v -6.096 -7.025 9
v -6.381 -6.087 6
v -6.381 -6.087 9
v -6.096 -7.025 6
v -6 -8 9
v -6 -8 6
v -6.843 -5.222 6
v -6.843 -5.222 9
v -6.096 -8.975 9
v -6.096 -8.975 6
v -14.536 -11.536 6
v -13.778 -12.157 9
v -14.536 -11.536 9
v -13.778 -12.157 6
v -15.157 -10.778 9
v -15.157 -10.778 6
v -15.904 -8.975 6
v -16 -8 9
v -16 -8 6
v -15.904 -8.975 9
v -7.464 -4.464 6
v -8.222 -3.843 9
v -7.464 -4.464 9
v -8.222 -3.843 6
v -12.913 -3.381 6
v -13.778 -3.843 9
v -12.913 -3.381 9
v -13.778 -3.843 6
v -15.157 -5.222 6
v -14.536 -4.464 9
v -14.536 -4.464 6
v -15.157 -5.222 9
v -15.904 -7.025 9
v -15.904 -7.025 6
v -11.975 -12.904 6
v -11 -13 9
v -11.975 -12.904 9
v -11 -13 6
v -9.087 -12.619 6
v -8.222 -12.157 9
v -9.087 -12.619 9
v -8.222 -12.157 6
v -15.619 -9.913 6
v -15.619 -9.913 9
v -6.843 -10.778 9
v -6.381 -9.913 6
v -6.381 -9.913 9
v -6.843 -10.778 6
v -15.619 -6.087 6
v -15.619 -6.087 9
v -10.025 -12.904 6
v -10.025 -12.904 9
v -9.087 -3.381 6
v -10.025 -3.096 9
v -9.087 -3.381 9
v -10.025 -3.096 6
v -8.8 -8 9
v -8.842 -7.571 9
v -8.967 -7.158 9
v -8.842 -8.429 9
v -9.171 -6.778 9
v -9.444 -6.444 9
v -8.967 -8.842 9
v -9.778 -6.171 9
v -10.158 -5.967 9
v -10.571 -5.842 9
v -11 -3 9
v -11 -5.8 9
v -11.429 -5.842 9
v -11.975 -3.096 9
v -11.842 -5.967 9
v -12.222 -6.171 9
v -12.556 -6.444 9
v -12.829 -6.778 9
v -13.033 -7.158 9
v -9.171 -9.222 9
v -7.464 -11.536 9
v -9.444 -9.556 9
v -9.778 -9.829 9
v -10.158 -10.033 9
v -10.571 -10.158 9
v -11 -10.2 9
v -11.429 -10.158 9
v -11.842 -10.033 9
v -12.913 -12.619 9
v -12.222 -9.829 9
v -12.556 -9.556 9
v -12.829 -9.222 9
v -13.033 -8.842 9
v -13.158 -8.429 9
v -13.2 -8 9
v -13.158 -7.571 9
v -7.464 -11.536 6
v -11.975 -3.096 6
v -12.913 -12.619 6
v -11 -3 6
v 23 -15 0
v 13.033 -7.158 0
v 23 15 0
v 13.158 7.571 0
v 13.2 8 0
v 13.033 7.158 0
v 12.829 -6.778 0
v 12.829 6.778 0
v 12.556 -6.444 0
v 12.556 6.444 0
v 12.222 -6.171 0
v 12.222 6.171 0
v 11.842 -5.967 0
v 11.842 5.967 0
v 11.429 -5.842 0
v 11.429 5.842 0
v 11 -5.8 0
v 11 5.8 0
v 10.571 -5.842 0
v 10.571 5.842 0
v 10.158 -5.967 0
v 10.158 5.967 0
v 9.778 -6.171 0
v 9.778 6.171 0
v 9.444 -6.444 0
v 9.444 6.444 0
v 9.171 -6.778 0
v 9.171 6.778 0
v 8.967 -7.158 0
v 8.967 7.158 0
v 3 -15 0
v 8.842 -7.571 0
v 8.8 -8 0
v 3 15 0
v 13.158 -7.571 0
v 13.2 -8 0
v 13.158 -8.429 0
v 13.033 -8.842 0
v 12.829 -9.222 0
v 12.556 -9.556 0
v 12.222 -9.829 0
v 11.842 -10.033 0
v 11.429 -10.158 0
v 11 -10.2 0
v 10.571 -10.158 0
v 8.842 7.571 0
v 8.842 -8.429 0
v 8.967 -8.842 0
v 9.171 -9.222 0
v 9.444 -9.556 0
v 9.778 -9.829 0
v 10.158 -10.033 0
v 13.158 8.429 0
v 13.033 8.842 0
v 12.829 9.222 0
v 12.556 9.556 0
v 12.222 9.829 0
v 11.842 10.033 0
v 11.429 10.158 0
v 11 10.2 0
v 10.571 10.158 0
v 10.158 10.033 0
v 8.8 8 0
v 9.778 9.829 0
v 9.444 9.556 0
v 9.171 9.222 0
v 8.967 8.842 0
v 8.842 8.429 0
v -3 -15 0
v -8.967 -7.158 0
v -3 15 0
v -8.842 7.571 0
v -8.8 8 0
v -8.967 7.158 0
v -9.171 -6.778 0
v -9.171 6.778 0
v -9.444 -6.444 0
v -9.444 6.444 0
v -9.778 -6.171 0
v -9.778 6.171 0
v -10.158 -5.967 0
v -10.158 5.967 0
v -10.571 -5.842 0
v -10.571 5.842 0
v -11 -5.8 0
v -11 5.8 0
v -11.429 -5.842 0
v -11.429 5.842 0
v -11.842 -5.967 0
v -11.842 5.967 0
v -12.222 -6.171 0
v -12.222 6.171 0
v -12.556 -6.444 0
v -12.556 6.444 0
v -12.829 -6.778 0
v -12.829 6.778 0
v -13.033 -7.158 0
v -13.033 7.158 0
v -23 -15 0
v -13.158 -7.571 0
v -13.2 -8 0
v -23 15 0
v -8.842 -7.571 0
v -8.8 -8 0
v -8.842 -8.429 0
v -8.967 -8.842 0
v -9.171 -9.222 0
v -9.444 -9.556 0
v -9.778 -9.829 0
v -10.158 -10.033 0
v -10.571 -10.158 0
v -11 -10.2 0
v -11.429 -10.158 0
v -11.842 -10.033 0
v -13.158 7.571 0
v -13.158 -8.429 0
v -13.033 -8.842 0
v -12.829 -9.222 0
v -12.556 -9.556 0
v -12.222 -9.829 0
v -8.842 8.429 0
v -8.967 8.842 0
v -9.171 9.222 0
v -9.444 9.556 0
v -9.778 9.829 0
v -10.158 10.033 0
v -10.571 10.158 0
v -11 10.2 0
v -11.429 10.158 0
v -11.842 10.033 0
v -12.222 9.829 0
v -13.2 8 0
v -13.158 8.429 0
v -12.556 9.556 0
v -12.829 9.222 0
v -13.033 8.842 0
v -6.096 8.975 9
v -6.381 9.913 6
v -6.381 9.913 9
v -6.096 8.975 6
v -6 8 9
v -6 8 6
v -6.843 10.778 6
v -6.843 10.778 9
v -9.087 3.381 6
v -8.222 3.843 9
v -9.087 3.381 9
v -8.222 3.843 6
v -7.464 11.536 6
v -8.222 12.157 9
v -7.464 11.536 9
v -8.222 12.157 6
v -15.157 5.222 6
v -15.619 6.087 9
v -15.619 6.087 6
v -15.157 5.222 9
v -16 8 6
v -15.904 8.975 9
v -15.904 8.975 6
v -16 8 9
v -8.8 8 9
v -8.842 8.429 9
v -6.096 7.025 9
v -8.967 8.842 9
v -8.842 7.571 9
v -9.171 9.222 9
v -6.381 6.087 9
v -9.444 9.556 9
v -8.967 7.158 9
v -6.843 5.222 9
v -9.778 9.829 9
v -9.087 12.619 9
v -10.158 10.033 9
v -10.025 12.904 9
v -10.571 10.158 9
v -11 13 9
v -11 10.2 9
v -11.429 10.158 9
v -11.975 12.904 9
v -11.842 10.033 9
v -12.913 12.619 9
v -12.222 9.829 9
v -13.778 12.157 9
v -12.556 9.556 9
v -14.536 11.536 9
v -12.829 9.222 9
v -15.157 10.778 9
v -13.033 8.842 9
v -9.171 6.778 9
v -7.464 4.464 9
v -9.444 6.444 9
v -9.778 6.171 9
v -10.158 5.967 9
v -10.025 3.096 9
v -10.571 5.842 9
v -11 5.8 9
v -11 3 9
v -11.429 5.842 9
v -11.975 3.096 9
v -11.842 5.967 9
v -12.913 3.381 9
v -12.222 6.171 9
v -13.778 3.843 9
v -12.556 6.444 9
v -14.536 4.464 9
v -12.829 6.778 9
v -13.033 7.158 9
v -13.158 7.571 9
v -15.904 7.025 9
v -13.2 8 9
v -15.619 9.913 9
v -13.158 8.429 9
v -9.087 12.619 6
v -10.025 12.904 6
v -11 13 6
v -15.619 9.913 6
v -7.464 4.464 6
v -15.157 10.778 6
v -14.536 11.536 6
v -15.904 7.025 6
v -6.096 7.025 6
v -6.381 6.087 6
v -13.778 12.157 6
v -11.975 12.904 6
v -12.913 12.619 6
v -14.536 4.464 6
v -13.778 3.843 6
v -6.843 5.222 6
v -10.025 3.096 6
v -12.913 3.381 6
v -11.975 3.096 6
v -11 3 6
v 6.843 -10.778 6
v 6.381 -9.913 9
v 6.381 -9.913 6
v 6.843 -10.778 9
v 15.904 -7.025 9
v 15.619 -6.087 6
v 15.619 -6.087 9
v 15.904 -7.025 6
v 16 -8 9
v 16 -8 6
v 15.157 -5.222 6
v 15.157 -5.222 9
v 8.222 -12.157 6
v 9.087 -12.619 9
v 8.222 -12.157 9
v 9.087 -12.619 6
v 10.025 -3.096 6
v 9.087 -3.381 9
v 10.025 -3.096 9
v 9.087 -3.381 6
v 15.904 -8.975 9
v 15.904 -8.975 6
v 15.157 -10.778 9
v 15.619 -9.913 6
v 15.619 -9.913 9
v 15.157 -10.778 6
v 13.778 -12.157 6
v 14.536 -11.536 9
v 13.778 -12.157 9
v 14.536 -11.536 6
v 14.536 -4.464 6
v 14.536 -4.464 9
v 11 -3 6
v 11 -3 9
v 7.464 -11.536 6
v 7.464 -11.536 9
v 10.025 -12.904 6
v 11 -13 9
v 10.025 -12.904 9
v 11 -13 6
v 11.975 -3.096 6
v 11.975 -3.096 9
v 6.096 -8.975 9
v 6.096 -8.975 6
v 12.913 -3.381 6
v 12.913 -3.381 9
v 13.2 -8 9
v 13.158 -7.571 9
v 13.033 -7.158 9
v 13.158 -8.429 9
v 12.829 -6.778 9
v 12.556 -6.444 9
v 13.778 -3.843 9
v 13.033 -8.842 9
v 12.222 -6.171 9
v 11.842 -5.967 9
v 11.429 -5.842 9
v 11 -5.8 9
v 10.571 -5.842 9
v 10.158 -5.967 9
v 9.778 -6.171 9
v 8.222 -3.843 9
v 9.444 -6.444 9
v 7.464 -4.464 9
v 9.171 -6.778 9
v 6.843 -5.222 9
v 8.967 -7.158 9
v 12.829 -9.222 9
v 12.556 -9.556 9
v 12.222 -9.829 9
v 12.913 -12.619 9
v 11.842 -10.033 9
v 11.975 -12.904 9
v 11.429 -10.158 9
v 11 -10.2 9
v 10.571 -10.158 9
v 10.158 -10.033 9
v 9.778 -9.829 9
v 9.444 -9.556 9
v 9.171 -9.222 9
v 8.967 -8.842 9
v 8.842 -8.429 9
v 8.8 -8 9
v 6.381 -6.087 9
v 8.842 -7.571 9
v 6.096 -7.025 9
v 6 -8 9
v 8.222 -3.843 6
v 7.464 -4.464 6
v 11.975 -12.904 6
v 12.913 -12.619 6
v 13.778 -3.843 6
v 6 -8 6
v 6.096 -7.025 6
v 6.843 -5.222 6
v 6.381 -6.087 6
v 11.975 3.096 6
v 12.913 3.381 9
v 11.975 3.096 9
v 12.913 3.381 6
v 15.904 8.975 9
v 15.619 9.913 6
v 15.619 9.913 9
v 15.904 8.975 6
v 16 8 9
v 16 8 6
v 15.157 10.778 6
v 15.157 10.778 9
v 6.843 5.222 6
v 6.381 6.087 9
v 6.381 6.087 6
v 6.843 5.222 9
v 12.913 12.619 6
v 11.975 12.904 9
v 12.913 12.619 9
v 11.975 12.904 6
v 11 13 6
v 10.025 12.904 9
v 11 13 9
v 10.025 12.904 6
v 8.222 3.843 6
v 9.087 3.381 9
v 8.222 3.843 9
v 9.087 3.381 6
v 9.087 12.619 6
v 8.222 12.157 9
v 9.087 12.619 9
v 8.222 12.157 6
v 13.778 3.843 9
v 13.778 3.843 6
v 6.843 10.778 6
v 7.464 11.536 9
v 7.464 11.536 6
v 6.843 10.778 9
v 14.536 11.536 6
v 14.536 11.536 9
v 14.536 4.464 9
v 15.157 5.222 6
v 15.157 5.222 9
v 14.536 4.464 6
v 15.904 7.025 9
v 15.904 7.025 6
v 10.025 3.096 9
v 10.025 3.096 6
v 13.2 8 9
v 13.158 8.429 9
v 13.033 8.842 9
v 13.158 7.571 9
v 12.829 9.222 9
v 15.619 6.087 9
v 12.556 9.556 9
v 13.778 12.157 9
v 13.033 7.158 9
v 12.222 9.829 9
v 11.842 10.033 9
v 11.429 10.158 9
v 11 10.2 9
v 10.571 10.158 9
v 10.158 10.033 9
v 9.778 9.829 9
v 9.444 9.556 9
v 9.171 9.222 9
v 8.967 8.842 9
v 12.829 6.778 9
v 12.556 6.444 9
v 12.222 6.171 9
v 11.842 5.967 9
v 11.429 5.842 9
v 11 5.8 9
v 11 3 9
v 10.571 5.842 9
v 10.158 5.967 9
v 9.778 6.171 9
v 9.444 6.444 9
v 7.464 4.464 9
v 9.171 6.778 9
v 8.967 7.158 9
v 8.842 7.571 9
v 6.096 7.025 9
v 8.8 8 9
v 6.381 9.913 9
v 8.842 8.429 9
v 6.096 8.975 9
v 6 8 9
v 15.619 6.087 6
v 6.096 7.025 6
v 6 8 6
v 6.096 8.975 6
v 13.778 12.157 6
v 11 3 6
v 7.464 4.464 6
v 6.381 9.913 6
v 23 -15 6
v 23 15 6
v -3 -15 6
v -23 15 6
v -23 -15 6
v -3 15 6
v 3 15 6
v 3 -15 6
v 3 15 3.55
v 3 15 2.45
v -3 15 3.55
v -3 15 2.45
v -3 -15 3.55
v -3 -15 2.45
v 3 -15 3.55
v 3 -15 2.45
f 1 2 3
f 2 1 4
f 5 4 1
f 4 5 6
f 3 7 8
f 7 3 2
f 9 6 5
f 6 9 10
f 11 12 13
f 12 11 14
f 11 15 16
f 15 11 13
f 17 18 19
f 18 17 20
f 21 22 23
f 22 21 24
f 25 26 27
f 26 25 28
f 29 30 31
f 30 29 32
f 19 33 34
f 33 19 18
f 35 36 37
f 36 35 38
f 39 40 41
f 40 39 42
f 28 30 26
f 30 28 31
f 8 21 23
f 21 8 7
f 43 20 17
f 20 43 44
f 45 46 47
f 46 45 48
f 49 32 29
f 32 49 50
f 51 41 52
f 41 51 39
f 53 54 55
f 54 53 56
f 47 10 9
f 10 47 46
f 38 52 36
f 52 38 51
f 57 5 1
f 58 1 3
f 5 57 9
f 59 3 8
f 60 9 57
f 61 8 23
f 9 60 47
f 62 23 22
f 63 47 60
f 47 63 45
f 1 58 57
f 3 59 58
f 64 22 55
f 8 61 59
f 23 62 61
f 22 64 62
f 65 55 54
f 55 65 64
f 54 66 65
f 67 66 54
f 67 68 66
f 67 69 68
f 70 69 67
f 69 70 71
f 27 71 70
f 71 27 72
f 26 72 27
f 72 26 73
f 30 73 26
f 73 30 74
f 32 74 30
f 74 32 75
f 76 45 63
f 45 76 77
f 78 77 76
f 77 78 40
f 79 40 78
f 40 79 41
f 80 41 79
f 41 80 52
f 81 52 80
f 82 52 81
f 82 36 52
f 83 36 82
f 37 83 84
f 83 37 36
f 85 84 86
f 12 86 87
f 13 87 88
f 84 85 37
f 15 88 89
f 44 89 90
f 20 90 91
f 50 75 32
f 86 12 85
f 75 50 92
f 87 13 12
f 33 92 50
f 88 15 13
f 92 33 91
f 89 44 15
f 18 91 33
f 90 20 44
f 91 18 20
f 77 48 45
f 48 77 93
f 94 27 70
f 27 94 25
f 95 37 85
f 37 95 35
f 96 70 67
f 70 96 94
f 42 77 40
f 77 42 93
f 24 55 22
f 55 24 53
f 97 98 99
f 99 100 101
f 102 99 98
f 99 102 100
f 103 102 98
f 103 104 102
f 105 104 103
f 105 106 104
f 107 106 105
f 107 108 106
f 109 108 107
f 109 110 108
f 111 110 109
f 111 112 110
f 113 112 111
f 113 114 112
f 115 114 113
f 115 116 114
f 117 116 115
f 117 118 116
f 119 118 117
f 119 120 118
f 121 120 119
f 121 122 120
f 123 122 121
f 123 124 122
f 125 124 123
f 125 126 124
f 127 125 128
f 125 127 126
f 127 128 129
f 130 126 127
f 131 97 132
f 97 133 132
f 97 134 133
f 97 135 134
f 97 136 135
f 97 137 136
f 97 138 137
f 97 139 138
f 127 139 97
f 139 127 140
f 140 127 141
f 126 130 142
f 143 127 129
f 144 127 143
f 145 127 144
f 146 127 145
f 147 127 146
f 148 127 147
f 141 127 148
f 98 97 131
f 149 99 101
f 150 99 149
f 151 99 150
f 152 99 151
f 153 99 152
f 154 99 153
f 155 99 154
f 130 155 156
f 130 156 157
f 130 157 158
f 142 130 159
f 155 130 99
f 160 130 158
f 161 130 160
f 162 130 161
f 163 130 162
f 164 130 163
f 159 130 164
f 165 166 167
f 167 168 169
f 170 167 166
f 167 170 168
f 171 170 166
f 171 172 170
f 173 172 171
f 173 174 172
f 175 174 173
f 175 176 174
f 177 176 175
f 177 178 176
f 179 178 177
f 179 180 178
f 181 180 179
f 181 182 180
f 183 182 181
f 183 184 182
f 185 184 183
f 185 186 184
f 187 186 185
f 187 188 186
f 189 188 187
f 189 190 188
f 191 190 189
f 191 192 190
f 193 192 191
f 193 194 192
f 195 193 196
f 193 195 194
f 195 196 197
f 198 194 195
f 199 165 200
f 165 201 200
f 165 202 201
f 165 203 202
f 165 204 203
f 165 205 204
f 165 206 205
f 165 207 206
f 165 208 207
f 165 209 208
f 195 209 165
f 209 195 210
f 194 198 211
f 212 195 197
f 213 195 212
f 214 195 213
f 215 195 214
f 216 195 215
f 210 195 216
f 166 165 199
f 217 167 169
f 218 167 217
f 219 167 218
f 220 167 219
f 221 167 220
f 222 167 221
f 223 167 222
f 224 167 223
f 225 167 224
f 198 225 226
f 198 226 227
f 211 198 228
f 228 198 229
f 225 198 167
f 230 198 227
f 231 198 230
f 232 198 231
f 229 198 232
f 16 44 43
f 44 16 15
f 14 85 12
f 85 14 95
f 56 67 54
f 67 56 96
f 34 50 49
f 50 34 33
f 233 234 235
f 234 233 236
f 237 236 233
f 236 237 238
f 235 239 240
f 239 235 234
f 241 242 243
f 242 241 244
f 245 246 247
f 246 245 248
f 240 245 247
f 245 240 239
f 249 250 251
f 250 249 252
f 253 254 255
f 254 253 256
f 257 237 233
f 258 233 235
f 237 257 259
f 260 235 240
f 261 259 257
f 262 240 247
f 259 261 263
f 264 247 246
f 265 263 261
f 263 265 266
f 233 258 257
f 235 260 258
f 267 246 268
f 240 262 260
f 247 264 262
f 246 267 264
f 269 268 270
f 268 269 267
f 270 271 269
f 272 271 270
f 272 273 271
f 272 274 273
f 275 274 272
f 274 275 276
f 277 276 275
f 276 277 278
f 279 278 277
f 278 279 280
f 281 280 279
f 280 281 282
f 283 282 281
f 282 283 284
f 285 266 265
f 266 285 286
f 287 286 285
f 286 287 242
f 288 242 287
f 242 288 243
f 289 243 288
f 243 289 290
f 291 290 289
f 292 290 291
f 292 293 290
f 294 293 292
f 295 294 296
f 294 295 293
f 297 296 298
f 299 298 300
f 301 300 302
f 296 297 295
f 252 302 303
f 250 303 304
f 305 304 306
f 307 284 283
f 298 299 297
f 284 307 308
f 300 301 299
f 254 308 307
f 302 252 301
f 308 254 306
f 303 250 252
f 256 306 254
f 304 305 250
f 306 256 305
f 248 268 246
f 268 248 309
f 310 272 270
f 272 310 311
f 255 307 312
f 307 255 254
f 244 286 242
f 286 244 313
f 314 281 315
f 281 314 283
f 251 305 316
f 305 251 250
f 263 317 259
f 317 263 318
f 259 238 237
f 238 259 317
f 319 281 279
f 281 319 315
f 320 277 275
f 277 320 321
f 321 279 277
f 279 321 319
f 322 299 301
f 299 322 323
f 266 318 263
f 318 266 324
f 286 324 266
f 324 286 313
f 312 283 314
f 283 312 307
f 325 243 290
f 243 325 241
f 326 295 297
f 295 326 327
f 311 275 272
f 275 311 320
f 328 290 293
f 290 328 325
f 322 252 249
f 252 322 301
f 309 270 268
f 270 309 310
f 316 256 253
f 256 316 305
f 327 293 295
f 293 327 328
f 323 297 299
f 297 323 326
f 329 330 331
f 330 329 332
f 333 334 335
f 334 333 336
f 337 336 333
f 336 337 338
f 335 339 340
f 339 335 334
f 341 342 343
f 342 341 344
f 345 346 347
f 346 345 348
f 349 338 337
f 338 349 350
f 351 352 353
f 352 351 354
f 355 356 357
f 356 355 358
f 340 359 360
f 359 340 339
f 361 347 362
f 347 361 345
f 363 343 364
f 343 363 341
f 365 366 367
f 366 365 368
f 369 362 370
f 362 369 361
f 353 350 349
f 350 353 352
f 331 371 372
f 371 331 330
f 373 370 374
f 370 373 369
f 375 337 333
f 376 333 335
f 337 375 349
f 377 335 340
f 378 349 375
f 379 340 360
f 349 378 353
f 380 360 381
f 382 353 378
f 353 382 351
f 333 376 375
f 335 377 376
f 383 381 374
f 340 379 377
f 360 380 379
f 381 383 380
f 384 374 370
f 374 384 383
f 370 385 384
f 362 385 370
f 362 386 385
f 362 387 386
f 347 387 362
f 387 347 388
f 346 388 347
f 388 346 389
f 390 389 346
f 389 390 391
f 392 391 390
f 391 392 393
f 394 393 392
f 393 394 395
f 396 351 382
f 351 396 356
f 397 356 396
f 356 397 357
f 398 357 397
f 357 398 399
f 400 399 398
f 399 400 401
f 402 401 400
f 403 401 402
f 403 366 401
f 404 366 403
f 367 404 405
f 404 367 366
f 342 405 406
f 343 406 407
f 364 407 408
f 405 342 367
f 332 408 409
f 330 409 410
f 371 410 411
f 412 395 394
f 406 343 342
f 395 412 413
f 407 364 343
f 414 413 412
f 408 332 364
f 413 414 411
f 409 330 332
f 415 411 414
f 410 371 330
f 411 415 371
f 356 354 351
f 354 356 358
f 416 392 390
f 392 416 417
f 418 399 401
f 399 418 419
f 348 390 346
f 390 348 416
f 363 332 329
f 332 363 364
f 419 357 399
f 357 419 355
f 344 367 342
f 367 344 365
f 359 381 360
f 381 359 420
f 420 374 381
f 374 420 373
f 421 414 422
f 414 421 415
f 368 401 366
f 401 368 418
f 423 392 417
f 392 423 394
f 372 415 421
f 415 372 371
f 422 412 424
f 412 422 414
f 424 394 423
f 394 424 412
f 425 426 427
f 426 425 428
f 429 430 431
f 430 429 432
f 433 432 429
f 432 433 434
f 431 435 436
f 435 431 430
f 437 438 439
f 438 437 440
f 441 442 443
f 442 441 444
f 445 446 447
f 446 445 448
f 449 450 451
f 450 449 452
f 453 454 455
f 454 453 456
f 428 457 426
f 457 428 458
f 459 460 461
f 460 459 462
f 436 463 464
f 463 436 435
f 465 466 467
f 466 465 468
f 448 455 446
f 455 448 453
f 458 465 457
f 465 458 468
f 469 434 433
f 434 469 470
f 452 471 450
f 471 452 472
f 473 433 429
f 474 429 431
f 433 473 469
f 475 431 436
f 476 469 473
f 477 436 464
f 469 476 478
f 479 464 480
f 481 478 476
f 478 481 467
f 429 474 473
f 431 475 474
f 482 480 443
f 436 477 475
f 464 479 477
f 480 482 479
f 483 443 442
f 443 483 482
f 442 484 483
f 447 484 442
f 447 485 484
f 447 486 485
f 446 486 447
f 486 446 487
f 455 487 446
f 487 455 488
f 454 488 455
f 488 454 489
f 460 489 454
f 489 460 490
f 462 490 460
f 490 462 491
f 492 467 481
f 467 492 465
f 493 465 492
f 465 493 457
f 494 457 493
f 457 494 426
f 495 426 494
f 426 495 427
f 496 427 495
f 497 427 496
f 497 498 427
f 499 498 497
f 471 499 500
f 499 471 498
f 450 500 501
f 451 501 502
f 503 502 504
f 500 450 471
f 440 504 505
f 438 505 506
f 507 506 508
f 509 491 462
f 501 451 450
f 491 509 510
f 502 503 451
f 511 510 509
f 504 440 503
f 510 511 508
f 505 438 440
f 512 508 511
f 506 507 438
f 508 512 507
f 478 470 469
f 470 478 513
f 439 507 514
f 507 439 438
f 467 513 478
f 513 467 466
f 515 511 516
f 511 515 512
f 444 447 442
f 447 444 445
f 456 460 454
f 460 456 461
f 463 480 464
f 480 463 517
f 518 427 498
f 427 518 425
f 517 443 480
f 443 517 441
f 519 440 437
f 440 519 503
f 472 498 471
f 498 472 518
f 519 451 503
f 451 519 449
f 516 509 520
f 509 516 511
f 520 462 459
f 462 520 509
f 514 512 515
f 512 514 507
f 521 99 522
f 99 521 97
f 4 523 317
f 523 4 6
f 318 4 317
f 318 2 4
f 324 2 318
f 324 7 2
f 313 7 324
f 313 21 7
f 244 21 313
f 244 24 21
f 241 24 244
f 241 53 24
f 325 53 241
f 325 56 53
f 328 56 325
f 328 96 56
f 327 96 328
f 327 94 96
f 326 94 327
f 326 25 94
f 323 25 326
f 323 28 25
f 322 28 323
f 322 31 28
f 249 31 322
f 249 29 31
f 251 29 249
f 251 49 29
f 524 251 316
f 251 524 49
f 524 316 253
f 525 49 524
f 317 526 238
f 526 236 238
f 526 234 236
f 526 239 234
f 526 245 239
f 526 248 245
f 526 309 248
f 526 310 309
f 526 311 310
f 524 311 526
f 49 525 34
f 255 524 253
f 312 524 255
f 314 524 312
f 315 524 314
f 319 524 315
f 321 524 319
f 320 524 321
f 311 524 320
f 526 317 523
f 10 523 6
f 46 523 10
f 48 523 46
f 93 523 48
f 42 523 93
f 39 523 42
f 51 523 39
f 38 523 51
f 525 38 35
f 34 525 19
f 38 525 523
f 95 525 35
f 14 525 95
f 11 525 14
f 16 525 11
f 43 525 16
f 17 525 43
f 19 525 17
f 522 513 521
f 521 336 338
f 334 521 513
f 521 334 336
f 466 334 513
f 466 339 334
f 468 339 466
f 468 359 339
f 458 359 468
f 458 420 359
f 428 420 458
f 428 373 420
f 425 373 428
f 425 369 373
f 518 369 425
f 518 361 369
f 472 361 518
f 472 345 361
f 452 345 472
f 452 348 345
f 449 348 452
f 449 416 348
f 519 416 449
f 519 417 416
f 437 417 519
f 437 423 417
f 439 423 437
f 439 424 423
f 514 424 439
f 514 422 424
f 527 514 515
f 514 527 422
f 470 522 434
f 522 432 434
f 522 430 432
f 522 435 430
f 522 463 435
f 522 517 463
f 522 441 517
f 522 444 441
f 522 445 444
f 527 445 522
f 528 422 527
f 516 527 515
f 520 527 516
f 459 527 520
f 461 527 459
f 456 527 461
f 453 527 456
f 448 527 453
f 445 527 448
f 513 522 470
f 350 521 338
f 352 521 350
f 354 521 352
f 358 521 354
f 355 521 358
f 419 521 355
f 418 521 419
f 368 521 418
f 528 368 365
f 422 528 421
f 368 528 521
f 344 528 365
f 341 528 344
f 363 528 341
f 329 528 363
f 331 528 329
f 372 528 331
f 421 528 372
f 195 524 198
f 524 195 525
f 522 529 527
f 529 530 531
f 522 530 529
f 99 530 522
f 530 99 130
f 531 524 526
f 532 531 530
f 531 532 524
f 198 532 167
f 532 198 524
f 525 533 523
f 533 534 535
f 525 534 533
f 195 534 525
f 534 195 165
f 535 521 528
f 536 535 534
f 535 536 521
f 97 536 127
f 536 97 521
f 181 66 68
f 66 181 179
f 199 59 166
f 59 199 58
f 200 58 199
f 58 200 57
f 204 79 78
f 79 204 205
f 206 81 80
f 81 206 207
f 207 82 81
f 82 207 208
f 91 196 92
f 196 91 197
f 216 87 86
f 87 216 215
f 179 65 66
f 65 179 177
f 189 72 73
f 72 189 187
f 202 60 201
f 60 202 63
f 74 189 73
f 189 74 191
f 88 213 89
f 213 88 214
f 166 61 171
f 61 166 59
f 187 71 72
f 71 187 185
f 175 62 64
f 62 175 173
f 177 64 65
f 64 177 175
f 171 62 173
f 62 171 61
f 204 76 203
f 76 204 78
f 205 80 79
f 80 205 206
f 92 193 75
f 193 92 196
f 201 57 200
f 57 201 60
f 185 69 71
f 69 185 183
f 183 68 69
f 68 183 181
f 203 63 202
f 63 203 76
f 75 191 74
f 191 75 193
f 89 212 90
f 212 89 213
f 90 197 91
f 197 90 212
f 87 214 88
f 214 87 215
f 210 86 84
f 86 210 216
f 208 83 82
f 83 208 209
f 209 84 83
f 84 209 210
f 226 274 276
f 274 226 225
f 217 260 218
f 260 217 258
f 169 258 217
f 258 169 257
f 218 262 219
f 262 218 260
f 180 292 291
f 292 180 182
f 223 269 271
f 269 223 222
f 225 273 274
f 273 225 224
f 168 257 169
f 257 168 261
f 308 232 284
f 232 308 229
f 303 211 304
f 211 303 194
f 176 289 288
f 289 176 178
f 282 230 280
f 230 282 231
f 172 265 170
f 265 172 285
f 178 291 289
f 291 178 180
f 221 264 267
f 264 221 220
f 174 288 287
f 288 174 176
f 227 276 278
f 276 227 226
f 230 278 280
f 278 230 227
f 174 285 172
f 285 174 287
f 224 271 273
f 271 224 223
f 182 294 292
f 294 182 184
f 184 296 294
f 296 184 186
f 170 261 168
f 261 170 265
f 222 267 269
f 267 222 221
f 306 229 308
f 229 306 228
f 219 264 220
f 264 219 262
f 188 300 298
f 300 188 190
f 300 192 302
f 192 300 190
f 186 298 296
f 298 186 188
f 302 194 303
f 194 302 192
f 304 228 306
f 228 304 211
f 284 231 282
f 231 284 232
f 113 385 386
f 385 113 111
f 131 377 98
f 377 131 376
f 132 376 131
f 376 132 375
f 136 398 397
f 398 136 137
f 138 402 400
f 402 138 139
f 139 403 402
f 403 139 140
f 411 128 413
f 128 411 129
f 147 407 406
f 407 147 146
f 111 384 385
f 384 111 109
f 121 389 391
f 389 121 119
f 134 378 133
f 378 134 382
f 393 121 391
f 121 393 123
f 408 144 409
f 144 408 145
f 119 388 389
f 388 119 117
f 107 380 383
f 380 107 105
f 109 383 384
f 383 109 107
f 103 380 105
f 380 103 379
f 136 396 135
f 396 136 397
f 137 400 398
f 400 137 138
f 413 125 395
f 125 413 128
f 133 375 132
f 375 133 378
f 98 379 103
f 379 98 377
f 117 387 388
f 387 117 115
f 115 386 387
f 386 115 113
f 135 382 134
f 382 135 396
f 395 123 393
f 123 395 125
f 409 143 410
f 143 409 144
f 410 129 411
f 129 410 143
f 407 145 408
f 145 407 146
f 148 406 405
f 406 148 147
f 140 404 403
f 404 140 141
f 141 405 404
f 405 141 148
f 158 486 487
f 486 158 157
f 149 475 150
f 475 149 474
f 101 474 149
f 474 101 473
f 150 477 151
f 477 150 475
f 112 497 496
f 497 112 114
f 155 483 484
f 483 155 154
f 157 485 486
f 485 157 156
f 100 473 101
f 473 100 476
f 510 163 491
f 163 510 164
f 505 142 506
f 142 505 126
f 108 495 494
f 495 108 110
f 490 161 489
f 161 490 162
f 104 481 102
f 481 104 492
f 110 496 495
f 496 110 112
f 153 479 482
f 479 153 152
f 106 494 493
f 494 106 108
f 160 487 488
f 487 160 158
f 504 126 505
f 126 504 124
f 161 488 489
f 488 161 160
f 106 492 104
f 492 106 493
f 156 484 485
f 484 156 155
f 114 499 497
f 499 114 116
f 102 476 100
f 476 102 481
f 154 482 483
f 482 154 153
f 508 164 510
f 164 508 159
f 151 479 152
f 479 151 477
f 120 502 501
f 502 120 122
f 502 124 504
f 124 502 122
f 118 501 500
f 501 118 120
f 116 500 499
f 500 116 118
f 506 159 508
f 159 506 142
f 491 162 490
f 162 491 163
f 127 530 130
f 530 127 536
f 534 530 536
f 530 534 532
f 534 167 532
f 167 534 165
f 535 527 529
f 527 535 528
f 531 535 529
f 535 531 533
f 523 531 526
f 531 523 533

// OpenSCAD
$fn = 32;

// ----------------------------------------------------------------------
// Living hinge: 46 x 30 mm plates, 1.1 mm flexible web
// ----------------------------------------------------------------------

// --- parameters (mm) ---
plate_len = 20;           // plate length outside the web
plate_w = 30;             // plate width
thick = 6;                // plate thickness
web_half = 3;             // half width of the flex band
web_t = 1.1;              // flexible web thickness
web_z = 2.45;             // web position inside the thickness
boss_d = 10;              // screw boss diameter
boss_h = 9;               // screw boss height
boss_x = 11;              // screw boss distance from the web
screw_d = 4.4;            // screw hole

difference() {
  union() {
    /* one flat strip, later thinned at the middle */
    translate([-23, -15, 0]) cube([46, 30, 6]);
    /* screw bosses, sunk 0.5 mm into the plates */
    for (sx = [-11, 11]) {
      for (sy = [-8, 8]) {
        translate([sx, sy, 0]) cylinder(h = boss_h, d = boss_d);
      }
    }
  }
  /* channel from below: leaves the web on top of it */
  translate([-3, -17.5, -2.5]) cube([6, 35, 4.95]);
  /* channel from above: thins the web down to web_t */
  translate([-3, -17.5, 3.55]) cube([6, 35, 4.95]);
  /* screw holes through the bosses */
  for (sx = [-11, 11]) {
    for (sy = [-8, 8]) {
      translate([sx, sy, -2.5]) cylinder(h = boss_h + 5, d = screw_d);
    }
  }
}
